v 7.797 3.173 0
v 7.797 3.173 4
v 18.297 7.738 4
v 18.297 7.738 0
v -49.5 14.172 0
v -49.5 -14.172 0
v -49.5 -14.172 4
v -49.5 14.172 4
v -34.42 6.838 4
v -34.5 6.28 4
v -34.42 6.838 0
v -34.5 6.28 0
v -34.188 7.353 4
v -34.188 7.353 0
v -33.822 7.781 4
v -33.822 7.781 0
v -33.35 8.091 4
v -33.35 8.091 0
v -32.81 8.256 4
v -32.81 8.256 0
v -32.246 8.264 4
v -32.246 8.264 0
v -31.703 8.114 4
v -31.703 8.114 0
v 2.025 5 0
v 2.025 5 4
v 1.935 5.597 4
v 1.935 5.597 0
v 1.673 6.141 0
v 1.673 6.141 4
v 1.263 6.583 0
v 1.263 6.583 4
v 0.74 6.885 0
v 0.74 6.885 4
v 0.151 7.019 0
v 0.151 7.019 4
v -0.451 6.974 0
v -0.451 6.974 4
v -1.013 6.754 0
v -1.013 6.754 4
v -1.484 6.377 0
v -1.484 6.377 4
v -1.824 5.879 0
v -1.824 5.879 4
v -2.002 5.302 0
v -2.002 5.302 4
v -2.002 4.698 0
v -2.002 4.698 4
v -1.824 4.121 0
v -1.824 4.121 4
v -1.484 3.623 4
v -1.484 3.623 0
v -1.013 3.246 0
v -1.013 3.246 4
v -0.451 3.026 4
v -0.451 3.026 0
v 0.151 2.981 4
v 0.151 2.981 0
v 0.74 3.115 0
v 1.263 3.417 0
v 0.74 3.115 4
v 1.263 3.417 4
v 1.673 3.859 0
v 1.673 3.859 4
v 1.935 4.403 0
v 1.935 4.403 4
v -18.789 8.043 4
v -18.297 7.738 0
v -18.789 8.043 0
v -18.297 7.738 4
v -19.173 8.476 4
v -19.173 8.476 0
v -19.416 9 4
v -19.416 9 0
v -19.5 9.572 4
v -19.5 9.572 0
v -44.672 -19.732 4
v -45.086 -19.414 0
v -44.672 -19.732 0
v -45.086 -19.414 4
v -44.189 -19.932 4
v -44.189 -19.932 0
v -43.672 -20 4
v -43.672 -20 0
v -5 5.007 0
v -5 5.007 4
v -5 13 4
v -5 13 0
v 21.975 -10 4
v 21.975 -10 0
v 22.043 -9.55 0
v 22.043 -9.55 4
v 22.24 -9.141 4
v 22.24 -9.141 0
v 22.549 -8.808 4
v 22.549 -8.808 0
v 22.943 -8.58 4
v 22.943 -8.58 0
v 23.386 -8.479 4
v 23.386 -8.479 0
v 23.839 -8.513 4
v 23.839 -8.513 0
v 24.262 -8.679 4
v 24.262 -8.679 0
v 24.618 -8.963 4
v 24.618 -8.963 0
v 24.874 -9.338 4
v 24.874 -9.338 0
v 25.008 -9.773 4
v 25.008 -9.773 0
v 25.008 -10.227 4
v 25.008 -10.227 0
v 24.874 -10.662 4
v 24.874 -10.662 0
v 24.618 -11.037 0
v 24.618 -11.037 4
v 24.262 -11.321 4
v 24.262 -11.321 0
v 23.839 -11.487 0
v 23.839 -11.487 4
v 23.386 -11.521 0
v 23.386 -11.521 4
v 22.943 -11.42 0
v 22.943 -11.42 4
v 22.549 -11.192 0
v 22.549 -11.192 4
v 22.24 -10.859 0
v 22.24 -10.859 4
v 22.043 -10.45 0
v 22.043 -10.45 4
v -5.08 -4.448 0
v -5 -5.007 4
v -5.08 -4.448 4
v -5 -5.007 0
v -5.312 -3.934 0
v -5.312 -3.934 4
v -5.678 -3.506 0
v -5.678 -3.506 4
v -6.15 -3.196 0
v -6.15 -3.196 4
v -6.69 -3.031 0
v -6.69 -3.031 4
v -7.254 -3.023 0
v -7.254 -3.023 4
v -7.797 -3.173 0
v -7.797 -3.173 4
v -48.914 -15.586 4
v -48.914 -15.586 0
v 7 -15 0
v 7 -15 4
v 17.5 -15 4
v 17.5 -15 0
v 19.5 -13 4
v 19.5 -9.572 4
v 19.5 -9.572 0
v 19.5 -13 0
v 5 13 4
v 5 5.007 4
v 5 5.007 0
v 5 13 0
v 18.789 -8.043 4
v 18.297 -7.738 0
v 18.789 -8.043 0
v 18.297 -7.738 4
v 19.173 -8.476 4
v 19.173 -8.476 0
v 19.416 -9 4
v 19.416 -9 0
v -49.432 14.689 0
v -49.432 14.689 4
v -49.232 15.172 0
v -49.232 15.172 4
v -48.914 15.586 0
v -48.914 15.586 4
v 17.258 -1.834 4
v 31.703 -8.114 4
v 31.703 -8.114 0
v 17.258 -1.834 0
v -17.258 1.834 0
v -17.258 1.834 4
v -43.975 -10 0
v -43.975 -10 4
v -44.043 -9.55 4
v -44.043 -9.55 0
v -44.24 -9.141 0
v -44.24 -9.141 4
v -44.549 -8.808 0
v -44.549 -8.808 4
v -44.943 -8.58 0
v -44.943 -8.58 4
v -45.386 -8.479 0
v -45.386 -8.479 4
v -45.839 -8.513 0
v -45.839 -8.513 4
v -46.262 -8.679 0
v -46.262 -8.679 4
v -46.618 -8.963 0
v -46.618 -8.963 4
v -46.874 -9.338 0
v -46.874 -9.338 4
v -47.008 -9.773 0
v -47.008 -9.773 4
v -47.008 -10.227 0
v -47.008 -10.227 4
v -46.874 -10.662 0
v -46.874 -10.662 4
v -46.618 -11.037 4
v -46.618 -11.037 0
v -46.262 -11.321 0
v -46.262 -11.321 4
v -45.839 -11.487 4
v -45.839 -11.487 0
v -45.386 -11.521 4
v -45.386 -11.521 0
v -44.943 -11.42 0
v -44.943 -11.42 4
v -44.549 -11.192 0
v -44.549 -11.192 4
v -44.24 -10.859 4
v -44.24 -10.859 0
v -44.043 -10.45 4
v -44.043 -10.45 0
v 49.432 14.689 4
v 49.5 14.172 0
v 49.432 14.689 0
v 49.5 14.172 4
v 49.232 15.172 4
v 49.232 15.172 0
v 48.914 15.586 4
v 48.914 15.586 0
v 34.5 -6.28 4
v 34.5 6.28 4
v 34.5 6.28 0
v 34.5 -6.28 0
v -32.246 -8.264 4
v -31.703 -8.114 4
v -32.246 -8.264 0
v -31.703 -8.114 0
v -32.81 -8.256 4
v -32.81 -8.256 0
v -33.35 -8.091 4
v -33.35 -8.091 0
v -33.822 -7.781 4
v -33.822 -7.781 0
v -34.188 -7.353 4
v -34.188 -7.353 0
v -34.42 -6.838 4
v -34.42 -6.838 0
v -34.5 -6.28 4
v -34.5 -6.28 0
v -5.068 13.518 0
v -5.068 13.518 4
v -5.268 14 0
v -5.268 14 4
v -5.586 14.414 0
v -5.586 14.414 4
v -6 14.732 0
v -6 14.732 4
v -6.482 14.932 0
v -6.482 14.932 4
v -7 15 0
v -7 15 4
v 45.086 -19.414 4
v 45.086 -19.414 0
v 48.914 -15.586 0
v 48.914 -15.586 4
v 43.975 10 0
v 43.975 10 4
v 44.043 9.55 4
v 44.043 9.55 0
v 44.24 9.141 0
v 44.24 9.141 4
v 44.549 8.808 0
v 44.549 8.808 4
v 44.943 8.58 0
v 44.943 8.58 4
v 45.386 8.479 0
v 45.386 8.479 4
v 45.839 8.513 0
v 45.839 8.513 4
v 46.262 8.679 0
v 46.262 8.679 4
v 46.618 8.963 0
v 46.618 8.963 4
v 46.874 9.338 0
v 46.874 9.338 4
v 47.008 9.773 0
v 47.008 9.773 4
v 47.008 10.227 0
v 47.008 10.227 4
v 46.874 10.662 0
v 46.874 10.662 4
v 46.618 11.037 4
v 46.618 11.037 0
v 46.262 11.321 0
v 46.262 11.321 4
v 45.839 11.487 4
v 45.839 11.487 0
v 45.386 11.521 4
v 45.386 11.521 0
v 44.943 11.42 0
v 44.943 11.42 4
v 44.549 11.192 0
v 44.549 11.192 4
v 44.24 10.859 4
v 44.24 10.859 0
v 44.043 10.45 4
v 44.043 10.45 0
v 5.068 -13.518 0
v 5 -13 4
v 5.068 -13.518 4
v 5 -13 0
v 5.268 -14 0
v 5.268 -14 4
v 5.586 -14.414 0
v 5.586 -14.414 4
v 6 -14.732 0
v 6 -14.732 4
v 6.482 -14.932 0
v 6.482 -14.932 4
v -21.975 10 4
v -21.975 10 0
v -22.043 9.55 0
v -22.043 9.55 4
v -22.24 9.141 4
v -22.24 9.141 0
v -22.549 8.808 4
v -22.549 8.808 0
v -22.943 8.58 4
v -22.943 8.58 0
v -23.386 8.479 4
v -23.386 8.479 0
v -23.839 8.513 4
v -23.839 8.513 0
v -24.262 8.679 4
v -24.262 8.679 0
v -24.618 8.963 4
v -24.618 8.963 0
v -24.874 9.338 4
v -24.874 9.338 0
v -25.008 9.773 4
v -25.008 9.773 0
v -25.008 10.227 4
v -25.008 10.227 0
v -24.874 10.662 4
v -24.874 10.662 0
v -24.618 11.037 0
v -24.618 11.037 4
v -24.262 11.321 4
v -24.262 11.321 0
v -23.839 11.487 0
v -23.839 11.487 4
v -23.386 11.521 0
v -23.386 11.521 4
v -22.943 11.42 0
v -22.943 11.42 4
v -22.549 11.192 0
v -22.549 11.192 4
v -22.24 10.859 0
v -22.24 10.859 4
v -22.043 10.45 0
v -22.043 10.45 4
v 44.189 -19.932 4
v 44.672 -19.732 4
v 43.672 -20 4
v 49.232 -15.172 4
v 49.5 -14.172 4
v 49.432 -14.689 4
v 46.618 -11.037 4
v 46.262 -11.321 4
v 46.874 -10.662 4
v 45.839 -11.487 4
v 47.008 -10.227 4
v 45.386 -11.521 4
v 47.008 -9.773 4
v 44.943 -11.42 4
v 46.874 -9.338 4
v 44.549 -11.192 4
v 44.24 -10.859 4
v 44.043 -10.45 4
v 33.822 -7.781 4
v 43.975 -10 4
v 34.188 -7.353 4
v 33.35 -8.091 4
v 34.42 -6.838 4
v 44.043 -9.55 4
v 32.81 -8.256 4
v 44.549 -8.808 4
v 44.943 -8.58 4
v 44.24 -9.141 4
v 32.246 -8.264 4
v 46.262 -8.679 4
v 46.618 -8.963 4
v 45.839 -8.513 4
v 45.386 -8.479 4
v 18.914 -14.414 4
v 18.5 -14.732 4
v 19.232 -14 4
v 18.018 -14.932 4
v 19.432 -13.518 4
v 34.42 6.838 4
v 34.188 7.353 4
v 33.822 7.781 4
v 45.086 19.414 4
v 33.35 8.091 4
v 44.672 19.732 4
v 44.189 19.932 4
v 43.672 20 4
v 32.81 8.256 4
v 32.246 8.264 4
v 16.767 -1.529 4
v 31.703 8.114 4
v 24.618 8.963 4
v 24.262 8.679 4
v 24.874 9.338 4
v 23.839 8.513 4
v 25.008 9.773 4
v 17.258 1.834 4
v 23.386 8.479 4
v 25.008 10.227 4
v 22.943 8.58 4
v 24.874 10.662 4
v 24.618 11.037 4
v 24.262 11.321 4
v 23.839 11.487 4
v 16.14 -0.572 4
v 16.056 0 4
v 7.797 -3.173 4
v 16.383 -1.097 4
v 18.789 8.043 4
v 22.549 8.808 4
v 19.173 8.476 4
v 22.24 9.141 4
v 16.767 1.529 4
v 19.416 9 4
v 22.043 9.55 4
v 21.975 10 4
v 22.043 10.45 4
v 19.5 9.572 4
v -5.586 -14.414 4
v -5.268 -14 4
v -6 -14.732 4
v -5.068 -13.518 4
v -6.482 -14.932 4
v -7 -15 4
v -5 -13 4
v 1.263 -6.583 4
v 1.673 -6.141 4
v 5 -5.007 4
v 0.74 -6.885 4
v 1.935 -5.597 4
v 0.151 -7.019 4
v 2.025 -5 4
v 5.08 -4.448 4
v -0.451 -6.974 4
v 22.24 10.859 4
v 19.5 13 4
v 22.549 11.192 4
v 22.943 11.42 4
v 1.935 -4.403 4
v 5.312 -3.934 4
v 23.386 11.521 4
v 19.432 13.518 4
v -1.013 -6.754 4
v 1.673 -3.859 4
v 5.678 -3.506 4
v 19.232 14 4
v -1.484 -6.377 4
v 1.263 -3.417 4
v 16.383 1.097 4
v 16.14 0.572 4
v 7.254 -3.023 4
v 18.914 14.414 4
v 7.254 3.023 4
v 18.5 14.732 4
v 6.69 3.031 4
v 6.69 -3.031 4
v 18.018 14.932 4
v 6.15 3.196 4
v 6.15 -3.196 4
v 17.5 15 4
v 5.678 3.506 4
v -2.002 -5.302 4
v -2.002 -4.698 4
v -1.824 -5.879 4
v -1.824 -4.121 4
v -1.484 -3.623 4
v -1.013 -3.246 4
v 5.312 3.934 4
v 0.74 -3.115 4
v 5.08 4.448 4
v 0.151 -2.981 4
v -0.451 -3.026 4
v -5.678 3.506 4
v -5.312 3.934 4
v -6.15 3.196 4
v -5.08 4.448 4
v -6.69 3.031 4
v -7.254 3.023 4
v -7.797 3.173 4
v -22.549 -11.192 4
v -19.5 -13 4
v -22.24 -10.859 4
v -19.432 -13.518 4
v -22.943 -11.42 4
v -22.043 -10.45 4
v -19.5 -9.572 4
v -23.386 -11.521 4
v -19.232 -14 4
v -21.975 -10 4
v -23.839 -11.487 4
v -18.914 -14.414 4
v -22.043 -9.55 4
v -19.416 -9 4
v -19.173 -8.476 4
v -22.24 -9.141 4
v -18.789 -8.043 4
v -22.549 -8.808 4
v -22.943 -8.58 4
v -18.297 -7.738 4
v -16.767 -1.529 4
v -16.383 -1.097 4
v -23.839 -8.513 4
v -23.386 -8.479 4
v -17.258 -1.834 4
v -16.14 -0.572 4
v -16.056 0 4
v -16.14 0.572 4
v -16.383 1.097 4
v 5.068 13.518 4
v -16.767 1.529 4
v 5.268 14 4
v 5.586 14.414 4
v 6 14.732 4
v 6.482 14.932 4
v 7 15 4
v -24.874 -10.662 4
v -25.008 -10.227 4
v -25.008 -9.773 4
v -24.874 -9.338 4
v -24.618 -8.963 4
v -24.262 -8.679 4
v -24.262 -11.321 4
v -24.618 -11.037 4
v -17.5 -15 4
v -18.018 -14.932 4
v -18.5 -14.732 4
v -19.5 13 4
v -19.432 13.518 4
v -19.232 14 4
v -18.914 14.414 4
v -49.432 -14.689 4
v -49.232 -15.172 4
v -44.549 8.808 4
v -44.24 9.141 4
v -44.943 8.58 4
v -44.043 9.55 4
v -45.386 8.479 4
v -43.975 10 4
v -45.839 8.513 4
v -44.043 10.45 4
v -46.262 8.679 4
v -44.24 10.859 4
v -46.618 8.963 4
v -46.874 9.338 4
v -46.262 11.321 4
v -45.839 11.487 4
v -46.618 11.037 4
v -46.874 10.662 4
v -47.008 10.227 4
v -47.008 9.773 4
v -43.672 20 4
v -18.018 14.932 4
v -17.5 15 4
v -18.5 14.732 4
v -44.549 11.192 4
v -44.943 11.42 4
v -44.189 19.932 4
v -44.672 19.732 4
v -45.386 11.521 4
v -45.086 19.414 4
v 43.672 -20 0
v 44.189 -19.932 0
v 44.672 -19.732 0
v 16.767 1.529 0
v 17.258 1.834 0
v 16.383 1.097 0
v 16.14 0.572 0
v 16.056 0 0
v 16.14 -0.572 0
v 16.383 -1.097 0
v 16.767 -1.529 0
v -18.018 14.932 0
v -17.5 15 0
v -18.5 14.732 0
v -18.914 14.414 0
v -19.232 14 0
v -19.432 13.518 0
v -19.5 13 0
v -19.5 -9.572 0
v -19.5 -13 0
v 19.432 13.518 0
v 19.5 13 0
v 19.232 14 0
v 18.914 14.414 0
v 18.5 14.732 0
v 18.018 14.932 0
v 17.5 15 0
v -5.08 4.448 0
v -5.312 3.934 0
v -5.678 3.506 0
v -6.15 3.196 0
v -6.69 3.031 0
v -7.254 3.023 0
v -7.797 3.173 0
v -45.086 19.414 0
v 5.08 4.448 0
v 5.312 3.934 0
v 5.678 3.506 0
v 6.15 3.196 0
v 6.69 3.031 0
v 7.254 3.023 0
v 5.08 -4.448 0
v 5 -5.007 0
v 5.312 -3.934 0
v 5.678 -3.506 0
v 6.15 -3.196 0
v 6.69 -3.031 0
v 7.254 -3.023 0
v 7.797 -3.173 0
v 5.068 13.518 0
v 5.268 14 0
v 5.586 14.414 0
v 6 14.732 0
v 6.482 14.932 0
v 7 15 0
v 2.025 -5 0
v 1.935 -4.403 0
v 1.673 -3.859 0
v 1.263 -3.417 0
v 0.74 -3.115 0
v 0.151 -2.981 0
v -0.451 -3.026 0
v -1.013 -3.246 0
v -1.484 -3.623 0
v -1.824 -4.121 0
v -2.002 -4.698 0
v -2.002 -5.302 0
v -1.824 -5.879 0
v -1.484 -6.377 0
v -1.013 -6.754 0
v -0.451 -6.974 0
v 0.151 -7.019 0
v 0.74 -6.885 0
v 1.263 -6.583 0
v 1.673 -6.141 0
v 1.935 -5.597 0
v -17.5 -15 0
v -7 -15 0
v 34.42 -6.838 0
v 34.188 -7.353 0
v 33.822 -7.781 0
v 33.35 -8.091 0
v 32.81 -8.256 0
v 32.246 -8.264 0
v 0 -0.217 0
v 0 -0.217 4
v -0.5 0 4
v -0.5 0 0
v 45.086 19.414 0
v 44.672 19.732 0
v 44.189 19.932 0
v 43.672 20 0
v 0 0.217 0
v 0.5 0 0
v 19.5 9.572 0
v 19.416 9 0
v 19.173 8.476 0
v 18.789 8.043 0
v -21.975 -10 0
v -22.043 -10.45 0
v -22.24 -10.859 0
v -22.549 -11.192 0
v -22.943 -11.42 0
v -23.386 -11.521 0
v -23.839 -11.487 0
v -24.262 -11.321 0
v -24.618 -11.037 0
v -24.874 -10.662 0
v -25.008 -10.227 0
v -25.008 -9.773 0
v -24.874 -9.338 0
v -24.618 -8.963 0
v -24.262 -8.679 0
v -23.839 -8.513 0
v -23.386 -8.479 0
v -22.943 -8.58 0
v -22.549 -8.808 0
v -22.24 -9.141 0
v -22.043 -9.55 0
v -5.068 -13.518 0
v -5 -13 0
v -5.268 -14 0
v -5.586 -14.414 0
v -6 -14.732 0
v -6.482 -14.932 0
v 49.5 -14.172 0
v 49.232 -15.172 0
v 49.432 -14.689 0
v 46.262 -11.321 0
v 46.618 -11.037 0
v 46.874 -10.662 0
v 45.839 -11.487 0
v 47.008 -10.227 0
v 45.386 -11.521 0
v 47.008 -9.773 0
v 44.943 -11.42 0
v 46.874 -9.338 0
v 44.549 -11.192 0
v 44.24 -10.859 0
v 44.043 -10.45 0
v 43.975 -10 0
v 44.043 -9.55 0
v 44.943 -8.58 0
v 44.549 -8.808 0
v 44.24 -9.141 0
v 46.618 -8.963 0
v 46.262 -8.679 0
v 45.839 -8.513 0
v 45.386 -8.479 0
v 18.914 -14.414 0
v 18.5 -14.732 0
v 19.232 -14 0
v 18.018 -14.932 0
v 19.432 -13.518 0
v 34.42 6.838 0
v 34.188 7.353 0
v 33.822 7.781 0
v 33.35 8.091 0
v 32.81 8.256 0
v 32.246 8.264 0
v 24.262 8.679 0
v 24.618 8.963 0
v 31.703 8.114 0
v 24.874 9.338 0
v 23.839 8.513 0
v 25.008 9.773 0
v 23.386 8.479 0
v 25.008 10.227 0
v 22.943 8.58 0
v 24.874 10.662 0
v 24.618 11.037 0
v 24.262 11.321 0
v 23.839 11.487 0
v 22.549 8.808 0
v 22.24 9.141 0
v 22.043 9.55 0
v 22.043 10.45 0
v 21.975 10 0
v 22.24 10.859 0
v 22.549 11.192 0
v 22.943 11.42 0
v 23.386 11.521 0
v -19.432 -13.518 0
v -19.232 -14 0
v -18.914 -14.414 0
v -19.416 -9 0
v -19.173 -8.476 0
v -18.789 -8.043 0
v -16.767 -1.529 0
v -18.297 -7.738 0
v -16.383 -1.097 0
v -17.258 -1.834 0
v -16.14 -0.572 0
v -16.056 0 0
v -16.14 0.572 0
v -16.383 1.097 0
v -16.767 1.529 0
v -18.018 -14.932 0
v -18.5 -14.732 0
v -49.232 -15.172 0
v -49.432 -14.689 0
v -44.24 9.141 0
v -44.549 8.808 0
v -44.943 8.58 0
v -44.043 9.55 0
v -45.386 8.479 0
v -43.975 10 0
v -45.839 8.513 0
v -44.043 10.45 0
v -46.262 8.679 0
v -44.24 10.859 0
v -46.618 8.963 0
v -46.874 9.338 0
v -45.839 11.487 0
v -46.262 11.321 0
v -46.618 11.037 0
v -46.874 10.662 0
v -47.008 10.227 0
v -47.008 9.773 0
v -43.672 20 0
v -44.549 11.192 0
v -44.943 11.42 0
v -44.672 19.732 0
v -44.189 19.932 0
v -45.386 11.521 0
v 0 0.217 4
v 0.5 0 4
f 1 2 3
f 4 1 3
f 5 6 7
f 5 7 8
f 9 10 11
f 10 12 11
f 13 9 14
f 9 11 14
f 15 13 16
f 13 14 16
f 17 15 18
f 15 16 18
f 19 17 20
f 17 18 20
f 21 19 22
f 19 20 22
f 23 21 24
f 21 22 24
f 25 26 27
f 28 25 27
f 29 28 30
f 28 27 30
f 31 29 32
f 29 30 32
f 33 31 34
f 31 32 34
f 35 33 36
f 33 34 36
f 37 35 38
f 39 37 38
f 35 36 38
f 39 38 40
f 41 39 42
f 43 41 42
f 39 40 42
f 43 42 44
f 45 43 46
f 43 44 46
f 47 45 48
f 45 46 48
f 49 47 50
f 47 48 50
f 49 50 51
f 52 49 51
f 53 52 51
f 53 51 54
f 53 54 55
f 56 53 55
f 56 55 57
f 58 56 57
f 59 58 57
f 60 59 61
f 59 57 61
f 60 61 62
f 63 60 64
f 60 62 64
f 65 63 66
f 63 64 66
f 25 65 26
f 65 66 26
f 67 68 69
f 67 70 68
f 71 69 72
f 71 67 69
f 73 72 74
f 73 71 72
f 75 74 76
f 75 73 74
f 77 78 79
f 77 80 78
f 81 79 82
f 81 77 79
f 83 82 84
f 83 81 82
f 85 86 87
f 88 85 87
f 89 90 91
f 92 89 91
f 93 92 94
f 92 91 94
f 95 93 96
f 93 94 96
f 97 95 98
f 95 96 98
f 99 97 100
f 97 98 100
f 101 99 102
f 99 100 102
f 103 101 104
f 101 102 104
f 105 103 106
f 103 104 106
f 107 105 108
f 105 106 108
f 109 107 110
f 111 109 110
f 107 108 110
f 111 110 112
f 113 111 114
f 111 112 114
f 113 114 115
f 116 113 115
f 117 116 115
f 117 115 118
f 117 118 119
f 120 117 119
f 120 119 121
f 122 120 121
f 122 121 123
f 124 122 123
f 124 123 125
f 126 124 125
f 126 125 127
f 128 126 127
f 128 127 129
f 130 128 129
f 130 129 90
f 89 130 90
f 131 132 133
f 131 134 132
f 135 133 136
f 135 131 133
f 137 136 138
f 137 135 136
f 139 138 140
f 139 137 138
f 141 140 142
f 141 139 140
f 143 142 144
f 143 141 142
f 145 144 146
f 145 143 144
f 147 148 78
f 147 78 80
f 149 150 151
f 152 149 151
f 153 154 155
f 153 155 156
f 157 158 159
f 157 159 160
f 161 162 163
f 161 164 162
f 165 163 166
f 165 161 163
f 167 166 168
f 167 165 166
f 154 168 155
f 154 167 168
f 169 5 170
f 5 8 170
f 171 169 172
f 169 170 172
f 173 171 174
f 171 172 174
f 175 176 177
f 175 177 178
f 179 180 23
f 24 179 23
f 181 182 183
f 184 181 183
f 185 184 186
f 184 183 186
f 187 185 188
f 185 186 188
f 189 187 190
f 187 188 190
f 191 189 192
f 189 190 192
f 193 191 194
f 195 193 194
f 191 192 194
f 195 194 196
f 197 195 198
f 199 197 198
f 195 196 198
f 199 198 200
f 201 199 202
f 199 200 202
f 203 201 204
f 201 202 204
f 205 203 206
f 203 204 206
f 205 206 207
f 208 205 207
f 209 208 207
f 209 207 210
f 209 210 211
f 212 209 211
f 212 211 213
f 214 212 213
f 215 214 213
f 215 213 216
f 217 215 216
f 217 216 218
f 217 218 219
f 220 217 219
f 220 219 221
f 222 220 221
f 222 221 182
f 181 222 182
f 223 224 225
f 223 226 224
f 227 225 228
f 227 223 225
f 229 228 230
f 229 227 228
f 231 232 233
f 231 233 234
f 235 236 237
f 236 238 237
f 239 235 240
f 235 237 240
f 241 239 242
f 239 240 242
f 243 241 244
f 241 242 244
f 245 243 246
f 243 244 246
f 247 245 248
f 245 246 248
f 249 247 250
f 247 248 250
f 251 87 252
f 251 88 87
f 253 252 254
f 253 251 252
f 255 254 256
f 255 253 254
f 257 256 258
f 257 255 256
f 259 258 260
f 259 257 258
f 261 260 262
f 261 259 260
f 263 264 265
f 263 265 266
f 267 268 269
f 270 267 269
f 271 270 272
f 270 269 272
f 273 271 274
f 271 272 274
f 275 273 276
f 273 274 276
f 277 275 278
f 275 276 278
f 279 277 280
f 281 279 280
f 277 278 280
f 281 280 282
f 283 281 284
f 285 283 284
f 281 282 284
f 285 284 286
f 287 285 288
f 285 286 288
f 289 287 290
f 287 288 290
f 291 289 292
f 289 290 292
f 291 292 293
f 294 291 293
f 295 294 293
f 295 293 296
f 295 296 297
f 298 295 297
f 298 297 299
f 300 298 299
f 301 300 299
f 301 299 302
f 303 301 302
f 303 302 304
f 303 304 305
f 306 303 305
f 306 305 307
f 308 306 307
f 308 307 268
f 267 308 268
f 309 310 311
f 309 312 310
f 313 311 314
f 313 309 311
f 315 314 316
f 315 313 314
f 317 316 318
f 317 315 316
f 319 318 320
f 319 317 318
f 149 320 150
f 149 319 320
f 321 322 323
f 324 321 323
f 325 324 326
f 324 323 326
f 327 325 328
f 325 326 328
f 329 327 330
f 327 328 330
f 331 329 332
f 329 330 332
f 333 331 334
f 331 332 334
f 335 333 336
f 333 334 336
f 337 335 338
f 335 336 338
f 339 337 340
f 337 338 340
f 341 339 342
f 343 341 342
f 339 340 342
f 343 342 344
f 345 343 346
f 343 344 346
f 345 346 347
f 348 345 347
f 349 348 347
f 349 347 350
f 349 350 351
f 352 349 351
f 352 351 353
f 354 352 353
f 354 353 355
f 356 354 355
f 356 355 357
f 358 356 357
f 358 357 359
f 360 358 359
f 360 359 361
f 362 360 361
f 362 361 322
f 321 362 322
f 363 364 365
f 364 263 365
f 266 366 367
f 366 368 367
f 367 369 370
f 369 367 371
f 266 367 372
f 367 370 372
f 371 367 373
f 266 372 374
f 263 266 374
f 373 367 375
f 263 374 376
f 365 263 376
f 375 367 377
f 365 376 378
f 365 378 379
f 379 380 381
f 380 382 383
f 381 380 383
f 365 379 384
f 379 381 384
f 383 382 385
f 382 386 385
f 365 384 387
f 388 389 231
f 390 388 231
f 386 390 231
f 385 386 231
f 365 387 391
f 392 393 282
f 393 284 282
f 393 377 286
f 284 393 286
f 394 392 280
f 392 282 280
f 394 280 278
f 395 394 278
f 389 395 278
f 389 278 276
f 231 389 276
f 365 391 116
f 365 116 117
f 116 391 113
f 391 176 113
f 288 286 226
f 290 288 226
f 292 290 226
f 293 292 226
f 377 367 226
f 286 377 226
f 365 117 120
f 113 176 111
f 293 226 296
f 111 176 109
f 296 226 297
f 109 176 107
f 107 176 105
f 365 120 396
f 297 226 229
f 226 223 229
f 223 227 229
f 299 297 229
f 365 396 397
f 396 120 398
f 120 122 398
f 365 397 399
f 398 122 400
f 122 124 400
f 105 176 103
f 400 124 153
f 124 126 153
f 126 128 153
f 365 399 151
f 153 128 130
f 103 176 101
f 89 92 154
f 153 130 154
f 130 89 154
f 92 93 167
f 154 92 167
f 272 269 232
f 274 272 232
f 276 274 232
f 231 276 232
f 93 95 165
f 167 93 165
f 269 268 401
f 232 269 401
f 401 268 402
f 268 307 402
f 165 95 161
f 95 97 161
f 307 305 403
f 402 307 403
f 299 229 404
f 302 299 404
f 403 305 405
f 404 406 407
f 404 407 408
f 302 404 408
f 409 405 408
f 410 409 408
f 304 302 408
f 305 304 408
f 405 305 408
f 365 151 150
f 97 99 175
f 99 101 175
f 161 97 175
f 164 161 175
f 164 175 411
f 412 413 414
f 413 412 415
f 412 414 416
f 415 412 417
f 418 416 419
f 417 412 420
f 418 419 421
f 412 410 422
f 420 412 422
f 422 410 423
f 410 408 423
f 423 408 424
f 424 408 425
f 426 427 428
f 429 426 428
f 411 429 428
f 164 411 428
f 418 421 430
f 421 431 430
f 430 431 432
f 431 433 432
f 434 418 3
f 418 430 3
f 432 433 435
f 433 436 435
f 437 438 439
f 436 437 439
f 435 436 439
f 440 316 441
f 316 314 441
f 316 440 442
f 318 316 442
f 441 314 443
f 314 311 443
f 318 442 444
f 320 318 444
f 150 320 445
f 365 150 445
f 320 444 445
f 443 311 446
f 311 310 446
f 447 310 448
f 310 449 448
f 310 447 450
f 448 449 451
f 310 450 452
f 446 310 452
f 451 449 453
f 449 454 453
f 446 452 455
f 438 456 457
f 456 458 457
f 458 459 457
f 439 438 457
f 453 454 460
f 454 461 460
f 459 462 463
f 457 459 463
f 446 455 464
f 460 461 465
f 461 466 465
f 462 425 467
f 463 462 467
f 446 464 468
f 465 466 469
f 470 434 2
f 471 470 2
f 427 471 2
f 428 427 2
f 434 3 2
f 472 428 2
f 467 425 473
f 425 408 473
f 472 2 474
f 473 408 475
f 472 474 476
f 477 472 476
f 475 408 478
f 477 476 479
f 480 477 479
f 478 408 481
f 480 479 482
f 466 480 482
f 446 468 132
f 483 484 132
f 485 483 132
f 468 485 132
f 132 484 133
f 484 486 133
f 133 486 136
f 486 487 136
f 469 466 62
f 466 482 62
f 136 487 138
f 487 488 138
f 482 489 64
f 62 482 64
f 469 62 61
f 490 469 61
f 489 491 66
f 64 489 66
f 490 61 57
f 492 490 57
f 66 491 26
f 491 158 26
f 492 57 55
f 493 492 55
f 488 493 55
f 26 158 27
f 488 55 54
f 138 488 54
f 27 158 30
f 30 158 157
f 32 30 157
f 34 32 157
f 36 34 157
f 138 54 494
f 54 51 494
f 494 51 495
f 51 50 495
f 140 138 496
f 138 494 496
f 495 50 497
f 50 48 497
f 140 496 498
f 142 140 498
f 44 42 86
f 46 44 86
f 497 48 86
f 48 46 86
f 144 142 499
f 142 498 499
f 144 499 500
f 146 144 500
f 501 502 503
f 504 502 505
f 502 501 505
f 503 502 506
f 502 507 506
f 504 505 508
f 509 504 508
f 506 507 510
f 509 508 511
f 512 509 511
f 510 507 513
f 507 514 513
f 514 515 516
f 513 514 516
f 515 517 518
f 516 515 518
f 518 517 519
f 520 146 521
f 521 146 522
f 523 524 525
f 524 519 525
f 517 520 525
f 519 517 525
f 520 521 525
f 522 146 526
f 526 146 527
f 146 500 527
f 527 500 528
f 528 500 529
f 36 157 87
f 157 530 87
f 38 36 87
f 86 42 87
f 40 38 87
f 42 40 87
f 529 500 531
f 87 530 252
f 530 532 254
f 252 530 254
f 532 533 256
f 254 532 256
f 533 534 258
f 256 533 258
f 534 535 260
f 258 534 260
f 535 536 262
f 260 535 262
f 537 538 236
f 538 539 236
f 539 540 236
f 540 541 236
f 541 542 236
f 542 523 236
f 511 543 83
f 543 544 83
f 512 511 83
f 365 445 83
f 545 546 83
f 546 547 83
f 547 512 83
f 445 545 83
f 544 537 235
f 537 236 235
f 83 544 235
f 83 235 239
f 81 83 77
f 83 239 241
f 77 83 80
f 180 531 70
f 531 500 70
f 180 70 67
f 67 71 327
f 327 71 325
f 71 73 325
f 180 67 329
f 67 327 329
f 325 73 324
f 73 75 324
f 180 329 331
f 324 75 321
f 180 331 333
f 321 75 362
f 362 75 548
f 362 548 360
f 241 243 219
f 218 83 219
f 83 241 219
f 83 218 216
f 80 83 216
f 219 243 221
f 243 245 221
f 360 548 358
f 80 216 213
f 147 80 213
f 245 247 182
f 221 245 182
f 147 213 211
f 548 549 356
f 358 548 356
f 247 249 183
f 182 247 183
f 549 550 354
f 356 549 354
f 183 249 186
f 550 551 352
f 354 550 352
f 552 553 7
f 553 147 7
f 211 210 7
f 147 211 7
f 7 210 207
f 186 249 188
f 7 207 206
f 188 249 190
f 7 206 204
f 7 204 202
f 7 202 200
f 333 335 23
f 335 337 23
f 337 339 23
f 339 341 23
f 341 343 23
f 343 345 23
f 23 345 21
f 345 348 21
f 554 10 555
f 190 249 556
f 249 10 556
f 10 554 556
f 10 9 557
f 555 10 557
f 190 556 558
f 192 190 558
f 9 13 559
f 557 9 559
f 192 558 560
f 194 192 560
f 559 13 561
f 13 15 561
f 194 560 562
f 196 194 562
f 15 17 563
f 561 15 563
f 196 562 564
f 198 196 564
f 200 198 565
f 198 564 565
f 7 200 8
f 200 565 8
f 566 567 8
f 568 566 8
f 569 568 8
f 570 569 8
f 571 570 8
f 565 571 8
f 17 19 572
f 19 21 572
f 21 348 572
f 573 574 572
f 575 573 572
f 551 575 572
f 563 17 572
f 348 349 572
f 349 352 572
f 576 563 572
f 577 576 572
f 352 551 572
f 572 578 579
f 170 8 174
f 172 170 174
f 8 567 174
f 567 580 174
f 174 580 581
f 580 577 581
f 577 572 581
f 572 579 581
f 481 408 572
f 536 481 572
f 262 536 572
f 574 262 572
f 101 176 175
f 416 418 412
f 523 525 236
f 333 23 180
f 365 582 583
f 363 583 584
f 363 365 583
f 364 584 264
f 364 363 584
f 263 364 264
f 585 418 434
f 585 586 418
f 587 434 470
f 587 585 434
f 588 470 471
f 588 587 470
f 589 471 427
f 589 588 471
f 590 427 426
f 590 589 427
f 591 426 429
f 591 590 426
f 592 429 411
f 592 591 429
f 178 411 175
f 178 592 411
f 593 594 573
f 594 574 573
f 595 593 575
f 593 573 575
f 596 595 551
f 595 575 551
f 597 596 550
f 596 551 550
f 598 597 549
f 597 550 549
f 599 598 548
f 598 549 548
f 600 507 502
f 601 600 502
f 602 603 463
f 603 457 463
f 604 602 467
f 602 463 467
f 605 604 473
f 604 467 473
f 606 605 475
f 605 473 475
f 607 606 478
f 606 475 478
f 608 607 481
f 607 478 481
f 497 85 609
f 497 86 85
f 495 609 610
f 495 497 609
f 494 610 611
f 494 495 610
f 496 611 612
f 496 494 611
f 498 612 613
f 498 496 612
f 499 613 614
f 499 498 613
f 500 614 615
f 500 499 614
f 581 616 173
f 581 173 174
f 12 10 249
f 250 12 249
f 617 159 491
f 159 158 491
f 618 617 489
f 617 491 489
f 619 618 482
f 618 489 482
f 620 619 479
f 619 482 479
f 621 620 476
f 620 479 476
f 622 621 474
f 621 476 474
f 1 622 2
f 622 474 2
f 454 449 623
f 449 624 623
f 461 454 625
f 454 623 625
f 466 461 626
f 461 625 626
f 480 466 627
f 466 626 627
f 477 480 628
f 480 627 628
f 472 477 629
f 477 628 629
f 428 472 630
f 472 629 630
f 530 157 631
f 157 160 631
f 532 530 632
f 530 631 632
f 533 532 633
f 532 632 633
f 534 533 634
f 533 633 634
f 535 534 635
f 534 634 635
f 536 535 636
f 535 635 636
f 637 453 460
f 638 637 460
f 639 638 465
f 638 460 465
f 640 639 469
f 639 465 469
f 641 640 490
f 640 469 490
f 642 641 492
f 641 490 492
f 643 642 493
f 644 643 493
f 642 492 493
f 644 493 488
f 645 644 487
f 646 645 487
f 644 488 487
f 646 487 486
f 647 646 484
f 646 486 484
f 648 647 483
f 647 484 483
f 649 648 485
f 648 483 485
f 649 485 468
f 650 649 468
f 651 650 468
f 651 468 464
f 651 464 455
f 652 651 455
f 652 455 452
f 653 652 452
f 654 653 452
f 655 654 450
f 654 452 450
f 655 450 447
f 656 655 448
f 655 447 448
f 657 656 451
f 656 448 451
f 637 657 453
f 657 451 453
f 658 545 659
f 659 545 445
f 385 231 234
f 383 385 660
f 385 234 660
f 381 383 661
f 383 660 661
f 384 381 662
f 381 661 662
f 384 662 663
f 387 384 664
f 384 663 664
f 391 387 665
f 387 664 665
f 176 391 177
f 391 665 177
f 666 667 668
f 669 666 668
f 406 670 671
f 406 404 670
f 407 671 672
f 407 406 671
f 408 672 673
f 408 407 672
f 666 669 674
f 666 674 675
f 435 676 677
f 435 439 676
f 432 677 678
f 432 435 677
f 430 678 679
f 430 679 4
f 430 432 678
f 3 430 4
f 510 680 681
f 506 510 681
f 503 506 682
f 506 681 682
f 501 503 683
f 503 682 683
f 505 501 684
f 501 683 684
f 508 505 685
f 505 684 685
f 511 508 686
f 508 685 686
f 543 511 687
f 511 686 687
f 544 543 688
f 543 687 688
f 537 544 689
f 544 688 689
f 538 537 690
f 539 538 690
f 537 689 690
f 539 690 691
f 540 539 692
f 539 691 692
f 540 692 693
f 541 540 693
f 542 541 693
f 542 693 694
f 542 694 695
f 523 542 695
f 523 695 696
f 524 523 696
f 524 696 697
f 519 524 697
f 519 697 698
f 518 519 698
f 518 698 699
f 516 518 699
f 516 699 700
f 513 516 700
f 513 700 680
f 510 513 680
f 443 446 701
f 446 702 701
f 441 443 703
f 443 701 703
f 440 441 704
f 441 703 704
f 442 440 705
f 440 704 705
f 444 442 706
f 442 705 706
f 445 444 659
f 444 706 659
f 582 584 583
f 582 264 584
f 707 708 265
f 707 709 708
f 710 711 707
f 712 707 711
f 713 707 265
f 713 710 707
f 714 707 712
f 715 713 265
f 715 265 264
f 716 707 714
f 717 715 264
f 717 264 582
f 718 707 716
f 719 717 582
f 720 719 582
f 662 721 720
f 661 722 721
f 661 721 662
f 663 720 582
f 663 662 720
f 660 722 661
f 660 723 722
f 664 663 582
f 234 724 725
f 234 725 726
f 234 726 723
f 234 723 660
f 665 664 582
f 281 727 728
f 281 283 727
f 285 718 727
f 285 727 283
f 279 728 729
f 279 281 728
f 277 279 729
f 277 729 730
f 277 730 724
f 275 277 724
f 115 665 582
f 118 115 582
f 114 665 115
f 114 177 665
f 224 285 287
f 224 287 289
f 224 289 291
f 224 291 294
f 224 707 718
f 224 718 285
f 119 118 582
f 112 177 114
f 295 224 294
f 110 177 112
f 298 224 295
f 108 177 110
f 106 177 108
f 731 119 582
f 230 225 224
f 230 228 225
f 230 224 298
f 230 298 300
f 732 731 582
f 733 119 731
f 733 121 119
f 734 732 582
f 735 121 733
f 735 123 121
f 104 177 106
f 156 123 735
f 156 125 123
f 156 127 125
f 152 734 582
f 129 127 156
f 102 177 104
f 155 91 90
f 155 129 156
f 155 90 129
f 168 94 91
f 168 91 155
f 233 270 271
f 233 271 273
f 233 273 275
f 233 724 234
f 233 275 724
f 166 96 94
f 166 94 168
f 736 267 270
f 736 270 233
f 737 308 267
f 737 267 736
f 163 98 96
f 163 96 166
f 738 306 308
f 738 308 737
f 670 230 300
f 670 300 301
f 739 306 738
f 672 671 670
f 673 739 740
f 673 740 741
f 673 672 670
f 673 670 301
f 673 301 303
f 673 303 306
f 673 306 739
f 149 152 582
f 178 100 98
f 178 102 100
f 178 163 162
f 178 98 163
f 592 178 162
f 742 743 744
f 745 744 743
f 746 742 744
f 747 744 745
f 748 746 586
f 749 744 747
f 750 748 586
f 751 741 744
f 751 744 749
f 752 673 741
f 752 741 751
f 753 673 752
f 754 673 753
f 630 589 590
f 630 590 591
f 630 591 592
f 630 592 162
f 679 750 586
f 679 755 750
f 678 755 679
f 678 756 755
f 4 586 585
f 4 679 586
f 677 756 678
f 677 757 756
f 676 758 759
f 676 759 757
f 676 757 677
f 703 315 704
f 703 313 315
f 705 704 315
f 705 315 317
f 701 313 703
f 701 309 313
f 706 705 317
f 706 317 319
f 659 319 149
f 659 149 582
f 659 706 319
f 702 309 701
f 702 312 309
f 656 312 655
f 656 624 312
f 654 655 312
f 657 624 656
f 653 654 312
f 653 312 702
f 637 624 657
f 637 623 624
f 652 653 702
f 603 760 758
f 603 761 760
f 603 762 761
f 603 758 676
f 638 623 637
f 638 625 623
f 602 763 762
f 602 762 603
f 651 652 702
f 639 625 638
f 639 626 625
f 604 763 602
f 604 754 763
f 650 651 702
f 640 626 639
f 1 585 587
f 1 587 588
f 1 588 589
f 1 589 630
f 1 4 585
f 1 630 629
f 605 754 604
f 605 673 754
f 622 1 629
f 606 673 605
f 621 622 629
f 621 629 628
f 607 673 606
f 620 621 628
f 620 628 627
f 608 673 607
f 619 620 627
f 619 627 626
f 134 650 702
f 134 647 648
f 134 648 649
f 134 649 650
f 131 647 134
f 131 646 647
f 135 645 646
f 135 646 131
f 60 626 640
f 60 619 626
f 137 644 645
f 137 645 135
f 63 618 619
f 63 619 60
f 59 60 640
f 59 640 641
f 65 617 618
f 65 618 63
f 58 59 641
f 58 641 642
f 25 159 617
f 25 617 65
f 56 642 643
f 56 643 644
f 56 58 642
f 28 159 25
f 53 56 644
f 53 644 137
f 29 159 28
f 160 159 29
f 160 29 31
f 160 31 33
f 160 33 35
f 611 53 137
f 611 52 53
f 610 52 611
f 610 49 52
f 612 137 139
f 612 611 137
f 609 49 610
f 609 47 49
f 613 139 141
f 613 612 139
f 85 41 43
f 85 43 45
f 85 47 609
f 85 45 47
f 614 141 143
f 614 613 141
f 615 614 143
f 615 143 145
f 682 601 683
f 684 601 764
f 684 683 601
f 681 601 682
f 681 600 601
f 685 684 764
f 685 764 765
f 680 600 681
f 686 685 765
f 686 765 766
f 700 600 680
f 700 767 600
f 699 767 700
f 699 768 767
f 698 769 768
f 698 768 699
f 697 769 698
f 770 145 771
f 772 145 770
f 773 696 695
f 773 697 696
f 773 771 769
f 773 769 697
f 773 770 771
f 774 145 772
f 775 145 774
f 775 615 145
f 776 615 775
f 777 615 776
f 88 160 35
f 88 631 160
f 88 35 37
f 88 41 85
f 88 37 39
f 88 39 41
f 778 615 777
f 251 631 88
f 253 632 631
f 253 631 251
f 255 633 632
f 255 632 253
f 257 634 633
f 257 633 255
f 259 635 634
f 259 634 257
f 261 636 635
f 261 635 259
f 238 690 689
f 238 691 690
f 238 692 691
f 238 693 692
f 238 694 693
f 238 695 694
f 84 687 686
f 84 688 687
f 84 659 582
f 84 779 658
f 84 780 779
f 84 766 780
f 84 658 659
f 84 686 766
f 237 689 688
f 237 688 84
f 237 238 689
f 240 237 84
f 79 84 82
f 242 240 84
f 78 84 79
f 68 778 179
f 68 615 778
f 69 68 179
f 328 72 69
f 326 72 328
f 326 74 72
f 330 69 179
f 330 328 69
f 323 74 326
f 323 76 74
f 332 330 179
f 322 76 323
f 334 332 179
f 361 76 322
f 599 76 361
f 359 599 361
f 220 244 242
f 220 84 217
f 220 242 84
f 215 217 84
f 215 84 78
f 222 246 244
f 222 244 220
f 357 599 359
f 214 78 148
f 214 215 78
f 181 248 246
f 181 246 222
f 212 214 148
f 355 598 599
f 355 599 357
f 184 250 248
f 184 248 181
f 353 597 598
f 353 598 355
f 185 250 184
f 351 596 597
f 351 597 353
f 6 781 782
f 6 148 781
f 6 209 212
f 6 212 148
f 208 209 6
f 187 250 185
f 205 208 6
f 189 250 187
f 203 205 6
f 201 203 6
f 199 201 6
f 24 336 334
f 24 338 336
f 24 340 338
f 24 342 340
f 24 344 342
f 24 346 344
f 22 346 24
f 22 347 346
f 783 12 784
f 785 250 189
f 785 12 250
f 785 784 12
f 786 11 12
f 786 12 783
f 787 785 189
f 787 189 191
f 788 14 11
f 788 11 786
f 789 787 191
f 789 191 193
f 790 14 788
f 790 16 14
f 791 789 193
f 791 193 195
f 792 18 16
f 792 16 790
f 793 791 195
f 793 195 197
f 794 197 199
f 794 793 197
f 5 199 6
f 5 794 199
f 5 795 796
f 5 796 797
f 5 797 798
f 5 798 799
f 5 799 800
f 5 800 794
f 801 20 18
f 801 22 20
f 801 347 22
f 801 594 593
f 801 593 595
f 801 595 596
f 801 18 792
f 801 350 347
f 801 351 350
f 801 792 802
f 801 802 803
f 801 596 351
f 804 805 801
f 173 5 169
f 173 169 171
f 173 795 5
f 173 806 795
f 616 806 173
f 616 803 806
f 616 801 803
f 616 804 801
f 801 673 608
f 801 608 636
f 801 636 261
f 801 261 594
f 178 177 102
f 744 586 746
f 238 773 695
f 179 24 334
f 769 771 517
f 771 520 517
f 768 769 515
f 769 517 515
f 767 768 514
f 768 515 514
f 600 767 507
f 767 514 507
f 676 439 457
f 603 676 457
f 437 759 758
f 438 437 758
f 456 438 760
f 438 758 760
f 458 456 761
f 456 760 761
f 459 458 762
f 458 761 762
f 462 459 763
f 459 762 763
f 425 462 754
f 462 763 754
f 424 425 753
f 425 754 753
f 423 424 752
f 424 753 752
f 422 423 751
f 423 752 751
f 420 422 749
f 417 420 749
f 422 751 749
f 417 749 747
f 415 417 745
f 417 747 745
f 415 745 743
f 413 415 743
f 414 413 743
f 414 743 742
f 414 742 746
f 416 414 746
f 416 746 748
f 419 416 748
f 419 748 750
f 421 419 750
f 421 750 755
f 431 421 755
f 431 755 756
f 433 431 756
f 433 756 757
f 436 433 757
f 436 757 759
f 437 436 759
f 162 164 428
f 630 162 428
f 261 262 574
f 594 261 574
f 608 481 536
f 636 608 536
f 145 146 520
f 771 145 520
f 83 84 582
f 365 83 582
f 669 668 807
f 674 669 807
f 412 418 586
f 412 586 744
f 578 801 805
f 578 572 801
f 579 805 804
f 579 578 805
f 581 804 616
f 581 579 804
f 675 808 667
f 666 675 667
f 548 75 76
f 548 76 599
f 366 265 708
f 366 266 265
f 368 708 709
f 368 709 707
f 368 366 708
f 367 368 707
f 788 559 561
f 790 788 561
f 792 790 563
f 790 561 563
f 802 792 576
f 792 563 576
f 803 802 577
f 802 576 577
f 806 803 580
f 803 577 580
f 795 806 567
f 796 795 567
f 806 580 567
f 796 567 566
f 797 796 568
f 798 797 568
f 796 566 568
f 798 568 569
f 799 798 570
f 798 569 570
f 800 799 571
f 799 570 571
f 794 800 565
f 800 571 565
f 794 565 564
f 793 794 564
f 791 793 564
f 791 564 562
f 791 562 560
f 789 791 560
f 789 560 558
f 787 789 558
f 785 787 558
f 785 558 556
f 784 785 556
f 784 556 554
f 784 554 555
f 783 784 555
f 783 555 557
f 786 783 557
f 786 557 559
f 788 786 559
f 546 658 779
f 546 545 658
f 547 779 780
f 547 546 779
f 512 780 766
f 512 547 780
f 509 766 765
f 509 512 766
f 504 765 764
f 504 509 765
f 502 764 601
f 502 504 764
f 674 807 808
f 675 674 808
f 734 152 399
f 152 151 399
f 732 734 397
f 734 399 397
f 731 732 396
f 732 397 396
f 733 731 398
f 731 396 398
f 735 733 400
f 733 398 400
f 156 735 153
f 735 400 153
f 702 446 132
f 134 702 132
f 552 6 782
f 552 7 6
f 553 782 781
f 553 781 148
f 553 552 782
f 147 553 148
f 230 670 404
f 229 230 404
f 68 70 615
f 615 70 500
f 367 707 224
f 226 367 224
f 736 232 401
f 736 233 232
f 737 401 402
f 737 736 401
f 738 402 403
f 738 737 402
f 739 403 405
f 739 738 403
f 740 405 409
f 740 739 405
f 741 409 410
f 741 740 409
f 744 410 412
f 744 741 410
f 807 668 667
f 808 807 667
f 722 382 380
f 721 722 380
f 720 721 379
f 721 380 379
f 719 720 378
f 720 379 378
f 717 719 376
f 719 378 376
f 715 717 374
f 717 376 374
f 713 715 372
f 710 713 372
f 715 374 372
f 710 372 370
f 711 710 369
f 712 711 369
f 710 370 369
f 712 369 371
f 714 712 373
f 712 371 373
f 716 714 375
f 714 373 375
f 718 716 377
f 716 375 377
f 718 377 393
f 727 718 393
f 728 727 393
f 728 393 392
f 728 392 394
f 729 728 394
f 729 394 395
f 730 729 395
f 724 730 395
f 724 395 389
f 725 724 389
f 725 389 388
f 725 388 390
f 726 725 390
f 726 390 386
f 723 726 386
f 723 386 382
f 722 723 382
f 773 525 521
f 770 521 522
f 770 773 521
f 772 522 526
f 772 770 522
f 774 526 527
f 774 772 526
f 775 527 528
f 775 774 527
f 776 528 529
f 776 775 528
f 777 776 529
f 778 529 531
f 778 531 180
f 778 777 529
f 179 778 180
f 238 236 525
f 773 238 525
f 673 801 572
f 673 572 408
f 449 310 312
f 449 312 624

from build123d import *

# Parameters (mm, degrees)
SKETCH_1_W          = 99
SKETCH_1_H          = 40
EXTRUDE_1_DEPTH     = 4
CHAMFER_1_SIZE      = 5
SKETCH_3_R          = 1.525
CUT_EXTRUDE_1_DEPTH = 10
CUT_EXTRUDE_2_DEPTH = 10
SKETCH_5_W          = 10
SKETCH_5_H          = 30
EXTRUDE_2_DEPTH     = 4
FILLET_2_R          = 2
FILLET_3_R          = 2
EXTRUDE_3_DEPTH     = 4
FILLET_4_R          = 2
SKETCH_7_R          = 1.525
CUT_EXTRUDE_3_DEPTH = 54.537370126
SKETCH_8_R          = 2.025
CUT_EXTRUDE_4_DEPTH = 4


with BuildPart() as part:
    # 草图1 → 凸台-拉伸1 (new body)
    with BuildSketch(Plane.XY):
        Rectangle(SKETCH_1_W, SKETCH_1_H)
    extrude(amount=EXTRUDE_1_DEPTH)

    # 倒角1
    chamfer_1_edges = [part.edges().sort_by_distance(p)[0] for p in [
        (49.5, -20, 2),
        (-49.5, -20, 2),
        (-49.5, 20, 2),
        (49.5, 20, 2),
    ]]
    chamfer(chamfer_1_edges, length=CHAMFER_1_SIZE)

    # 草图3 → 切除-拉伸1 (cut)
    with BuildSketch(Plane.XY.offset(4)):
        with Locations((-45.5, 10)):
            Circle(SKETCH_3_R)
        with Locations((-45.5, -10)):
            Circle(SKETCH_3_R)
        with Locations(Location((45.5, -10, 0), (0, 0, 180))):
            Circle(SKETCH_3_R)
        with Locations(Location((45.5, 10, 0), (0, 0, 180))):
            Circle(SKETCH_3_R)
    extrude(amount=-CUT_EXTRUDE_1_DEPTH, mode=Mode.SUBTRACT)

    # 草图4 → 切除-拉伸2 (cut)
    with BuildSketch(Plane.XY.offset(4)):
        Polygon((35, 15), (-35, 15), (-0.5, 0), (0, 0.217391304), (0.5, 0), align=None)
        Polygon((0, -0.217391304), (-0.5, 0), (-35, -15), (35, -15), (0.5, 0), align=None)
        Polygon((-34.5, -9.33046252), (-13.039936204, 0), (-34.5, 9.33046252), align=None)
        Polygon((34.5, -9.33046252), (13.039936204, 0), (34.5, 9.33046252), align=None)
    extrude(amount=-CUT_EXTRUDE_2_DEPTH, mode=Mode.SUBTRACT)


with BuildPart() as cut_extrude_2_piece_1:
    # of the separate pieces the step leaves, piece 1, a body of its own (cut_extrude_2_pieces)
    add(part.part.solids().sort_by_distance((-44.5, -20, 0))[0])

    # 草图5 → 凸台-拉伸2 (add)
    with BuildSketch(Plane.XY.offset(4)):
        Rectangle(SKETCH_5_W, SKETCH_5_H)
    extrude(amount=-EXTRUDE_2_DEPTH)

    # 圆角2
    fillet_2_edges = [cut_extrude_2_piece_1.edges().sort_by_distance(p)[0] for p in [
        (34.5, -9.33046252, 2),
        (-5, -1.956521739, 2),
        (-5, -15, 2),
        (5, -1.956521739, 2),
        (-5, 15, 2),
        (-5, 1.956521739, 2),
        (5, -15, 2),
        (5, 1.956521739, 2),
        (5, 15, 2),
        (-35, 15, 2),
        (35, 15, 2),
        (35, -15, 2),
        (-35, -15, 2),
        (-34.5, -9.33046252, 2),
        (-34.5, 9.33046252, 2),
        (-13.039936204, 0, 2),
        (13.039936204, 0, 2),
        (34.5, 9.33046252, 2),
    ]]
    fillet(fillet_2_edges, radius=FILLET_2_R)

    # 圆角3
    fillet_3_edges = [cut_extrude_2_piece_1.edges().sort_by_distance(p)[0] for p in [
        (49.5, -15, 2),
        (49.5, 15, 2),
        (44.5, 20, 2),
        (-44.5, 20, 2),
        (-49.5, -15, 2),
        (-49.5, 15, 2),
        (44.5, -20, 2),
        (-44.5, -20, 2),
    ]]
    fillet(fillet_3_edges, radius=FILLET_3_R)

    # 草图6 → 凸台-拉伸3 (add)
    with BuildSketch(Plane(origin=(0, 0, 0), x_dir=(-1, 0, 0), z_dir=(0, 0, -1))):
        Polygon((-19.5, 8.260869565), (-19.5, 15), (-35, 15), align=None)
        Polygon((35, 15), (19.5, 8.260869565), (19.5, 15), align=None)
        Polygon((19.5, -8.260869565), (19.5, -15), (35, -15), align=None)
        Polygon((-35, -15), (-19.5, -8.260869565), (-19.5, -15), align=None)
    extrude(amount=-EXTRUDE_3_DEPTH)

    # 圆角4
    fillet_4_edges = [cut_extrude_2_piece_1.edges().sort_by_distance(p)[0] for p in [
        (19.5, 8.260869565, 2),
        (19.5, 15, 2),
        (-19.5, 15, 2),
        (-19.5, 8.260869565, 2),
        (-19.5, -8.260869565, 2),
        (-19.5, -15, 2),
        (19.5, -15, 2),
        (19.5, -8.260869565, 2),
    ]]
    fillet(fillet_4_edges, radius=FILLET_4_R)

    # 草图7 → 切除-拉伸3 (cut, through all)
    with BuildSketch(Plane(origin=(0, 0, 0), x_dir=(-1, 0, 0), z_dir=(0, 0, -1))):
        with Locations((-23.5, 10)):
            Circle(SKETCH_7_R)
        with Locations((-23.5, -10)):
            Circle(SKETCH_7_R)
        with Locations(Location((23.5, -10, 0), (0, 0, 180))):
            Circle(SKETCH_7_R)
        with Locations(Location((23.5, 10, 0), (0, 0, 180))):
            Circle(SKETCH_7_R)
    extrude(amount=-CUT_EXTRUDE_3_DEPTH, mode=Mode.SUBTRACT)

    # 草图8 → 切除-拉伸4 (cut)
    with BuildSketch(Plane.XY.offset(4)):
        with Locations((0, 5)):
            Circle(SKETCH_8_R)
        with Locations((0, -5)):
            Circle(SKETCH_8_R)
    extrude(amount=-CUT_EXTRUDE_4_DEPTH, mode=Mode.SUBTRACT)


with BuildPart() as cut_extrude_2_piece_2:
    # of the separate pieces the step leaves, piece 2, a body of its own (cut_extrude_2_pieces)
    add(part.part.solids().sort_by_distance((0, -0.217391304, 0))[0])


solid = Compound([cut_extrude_2_piece_1.part, cut_extrude_2_piece_2.part])
